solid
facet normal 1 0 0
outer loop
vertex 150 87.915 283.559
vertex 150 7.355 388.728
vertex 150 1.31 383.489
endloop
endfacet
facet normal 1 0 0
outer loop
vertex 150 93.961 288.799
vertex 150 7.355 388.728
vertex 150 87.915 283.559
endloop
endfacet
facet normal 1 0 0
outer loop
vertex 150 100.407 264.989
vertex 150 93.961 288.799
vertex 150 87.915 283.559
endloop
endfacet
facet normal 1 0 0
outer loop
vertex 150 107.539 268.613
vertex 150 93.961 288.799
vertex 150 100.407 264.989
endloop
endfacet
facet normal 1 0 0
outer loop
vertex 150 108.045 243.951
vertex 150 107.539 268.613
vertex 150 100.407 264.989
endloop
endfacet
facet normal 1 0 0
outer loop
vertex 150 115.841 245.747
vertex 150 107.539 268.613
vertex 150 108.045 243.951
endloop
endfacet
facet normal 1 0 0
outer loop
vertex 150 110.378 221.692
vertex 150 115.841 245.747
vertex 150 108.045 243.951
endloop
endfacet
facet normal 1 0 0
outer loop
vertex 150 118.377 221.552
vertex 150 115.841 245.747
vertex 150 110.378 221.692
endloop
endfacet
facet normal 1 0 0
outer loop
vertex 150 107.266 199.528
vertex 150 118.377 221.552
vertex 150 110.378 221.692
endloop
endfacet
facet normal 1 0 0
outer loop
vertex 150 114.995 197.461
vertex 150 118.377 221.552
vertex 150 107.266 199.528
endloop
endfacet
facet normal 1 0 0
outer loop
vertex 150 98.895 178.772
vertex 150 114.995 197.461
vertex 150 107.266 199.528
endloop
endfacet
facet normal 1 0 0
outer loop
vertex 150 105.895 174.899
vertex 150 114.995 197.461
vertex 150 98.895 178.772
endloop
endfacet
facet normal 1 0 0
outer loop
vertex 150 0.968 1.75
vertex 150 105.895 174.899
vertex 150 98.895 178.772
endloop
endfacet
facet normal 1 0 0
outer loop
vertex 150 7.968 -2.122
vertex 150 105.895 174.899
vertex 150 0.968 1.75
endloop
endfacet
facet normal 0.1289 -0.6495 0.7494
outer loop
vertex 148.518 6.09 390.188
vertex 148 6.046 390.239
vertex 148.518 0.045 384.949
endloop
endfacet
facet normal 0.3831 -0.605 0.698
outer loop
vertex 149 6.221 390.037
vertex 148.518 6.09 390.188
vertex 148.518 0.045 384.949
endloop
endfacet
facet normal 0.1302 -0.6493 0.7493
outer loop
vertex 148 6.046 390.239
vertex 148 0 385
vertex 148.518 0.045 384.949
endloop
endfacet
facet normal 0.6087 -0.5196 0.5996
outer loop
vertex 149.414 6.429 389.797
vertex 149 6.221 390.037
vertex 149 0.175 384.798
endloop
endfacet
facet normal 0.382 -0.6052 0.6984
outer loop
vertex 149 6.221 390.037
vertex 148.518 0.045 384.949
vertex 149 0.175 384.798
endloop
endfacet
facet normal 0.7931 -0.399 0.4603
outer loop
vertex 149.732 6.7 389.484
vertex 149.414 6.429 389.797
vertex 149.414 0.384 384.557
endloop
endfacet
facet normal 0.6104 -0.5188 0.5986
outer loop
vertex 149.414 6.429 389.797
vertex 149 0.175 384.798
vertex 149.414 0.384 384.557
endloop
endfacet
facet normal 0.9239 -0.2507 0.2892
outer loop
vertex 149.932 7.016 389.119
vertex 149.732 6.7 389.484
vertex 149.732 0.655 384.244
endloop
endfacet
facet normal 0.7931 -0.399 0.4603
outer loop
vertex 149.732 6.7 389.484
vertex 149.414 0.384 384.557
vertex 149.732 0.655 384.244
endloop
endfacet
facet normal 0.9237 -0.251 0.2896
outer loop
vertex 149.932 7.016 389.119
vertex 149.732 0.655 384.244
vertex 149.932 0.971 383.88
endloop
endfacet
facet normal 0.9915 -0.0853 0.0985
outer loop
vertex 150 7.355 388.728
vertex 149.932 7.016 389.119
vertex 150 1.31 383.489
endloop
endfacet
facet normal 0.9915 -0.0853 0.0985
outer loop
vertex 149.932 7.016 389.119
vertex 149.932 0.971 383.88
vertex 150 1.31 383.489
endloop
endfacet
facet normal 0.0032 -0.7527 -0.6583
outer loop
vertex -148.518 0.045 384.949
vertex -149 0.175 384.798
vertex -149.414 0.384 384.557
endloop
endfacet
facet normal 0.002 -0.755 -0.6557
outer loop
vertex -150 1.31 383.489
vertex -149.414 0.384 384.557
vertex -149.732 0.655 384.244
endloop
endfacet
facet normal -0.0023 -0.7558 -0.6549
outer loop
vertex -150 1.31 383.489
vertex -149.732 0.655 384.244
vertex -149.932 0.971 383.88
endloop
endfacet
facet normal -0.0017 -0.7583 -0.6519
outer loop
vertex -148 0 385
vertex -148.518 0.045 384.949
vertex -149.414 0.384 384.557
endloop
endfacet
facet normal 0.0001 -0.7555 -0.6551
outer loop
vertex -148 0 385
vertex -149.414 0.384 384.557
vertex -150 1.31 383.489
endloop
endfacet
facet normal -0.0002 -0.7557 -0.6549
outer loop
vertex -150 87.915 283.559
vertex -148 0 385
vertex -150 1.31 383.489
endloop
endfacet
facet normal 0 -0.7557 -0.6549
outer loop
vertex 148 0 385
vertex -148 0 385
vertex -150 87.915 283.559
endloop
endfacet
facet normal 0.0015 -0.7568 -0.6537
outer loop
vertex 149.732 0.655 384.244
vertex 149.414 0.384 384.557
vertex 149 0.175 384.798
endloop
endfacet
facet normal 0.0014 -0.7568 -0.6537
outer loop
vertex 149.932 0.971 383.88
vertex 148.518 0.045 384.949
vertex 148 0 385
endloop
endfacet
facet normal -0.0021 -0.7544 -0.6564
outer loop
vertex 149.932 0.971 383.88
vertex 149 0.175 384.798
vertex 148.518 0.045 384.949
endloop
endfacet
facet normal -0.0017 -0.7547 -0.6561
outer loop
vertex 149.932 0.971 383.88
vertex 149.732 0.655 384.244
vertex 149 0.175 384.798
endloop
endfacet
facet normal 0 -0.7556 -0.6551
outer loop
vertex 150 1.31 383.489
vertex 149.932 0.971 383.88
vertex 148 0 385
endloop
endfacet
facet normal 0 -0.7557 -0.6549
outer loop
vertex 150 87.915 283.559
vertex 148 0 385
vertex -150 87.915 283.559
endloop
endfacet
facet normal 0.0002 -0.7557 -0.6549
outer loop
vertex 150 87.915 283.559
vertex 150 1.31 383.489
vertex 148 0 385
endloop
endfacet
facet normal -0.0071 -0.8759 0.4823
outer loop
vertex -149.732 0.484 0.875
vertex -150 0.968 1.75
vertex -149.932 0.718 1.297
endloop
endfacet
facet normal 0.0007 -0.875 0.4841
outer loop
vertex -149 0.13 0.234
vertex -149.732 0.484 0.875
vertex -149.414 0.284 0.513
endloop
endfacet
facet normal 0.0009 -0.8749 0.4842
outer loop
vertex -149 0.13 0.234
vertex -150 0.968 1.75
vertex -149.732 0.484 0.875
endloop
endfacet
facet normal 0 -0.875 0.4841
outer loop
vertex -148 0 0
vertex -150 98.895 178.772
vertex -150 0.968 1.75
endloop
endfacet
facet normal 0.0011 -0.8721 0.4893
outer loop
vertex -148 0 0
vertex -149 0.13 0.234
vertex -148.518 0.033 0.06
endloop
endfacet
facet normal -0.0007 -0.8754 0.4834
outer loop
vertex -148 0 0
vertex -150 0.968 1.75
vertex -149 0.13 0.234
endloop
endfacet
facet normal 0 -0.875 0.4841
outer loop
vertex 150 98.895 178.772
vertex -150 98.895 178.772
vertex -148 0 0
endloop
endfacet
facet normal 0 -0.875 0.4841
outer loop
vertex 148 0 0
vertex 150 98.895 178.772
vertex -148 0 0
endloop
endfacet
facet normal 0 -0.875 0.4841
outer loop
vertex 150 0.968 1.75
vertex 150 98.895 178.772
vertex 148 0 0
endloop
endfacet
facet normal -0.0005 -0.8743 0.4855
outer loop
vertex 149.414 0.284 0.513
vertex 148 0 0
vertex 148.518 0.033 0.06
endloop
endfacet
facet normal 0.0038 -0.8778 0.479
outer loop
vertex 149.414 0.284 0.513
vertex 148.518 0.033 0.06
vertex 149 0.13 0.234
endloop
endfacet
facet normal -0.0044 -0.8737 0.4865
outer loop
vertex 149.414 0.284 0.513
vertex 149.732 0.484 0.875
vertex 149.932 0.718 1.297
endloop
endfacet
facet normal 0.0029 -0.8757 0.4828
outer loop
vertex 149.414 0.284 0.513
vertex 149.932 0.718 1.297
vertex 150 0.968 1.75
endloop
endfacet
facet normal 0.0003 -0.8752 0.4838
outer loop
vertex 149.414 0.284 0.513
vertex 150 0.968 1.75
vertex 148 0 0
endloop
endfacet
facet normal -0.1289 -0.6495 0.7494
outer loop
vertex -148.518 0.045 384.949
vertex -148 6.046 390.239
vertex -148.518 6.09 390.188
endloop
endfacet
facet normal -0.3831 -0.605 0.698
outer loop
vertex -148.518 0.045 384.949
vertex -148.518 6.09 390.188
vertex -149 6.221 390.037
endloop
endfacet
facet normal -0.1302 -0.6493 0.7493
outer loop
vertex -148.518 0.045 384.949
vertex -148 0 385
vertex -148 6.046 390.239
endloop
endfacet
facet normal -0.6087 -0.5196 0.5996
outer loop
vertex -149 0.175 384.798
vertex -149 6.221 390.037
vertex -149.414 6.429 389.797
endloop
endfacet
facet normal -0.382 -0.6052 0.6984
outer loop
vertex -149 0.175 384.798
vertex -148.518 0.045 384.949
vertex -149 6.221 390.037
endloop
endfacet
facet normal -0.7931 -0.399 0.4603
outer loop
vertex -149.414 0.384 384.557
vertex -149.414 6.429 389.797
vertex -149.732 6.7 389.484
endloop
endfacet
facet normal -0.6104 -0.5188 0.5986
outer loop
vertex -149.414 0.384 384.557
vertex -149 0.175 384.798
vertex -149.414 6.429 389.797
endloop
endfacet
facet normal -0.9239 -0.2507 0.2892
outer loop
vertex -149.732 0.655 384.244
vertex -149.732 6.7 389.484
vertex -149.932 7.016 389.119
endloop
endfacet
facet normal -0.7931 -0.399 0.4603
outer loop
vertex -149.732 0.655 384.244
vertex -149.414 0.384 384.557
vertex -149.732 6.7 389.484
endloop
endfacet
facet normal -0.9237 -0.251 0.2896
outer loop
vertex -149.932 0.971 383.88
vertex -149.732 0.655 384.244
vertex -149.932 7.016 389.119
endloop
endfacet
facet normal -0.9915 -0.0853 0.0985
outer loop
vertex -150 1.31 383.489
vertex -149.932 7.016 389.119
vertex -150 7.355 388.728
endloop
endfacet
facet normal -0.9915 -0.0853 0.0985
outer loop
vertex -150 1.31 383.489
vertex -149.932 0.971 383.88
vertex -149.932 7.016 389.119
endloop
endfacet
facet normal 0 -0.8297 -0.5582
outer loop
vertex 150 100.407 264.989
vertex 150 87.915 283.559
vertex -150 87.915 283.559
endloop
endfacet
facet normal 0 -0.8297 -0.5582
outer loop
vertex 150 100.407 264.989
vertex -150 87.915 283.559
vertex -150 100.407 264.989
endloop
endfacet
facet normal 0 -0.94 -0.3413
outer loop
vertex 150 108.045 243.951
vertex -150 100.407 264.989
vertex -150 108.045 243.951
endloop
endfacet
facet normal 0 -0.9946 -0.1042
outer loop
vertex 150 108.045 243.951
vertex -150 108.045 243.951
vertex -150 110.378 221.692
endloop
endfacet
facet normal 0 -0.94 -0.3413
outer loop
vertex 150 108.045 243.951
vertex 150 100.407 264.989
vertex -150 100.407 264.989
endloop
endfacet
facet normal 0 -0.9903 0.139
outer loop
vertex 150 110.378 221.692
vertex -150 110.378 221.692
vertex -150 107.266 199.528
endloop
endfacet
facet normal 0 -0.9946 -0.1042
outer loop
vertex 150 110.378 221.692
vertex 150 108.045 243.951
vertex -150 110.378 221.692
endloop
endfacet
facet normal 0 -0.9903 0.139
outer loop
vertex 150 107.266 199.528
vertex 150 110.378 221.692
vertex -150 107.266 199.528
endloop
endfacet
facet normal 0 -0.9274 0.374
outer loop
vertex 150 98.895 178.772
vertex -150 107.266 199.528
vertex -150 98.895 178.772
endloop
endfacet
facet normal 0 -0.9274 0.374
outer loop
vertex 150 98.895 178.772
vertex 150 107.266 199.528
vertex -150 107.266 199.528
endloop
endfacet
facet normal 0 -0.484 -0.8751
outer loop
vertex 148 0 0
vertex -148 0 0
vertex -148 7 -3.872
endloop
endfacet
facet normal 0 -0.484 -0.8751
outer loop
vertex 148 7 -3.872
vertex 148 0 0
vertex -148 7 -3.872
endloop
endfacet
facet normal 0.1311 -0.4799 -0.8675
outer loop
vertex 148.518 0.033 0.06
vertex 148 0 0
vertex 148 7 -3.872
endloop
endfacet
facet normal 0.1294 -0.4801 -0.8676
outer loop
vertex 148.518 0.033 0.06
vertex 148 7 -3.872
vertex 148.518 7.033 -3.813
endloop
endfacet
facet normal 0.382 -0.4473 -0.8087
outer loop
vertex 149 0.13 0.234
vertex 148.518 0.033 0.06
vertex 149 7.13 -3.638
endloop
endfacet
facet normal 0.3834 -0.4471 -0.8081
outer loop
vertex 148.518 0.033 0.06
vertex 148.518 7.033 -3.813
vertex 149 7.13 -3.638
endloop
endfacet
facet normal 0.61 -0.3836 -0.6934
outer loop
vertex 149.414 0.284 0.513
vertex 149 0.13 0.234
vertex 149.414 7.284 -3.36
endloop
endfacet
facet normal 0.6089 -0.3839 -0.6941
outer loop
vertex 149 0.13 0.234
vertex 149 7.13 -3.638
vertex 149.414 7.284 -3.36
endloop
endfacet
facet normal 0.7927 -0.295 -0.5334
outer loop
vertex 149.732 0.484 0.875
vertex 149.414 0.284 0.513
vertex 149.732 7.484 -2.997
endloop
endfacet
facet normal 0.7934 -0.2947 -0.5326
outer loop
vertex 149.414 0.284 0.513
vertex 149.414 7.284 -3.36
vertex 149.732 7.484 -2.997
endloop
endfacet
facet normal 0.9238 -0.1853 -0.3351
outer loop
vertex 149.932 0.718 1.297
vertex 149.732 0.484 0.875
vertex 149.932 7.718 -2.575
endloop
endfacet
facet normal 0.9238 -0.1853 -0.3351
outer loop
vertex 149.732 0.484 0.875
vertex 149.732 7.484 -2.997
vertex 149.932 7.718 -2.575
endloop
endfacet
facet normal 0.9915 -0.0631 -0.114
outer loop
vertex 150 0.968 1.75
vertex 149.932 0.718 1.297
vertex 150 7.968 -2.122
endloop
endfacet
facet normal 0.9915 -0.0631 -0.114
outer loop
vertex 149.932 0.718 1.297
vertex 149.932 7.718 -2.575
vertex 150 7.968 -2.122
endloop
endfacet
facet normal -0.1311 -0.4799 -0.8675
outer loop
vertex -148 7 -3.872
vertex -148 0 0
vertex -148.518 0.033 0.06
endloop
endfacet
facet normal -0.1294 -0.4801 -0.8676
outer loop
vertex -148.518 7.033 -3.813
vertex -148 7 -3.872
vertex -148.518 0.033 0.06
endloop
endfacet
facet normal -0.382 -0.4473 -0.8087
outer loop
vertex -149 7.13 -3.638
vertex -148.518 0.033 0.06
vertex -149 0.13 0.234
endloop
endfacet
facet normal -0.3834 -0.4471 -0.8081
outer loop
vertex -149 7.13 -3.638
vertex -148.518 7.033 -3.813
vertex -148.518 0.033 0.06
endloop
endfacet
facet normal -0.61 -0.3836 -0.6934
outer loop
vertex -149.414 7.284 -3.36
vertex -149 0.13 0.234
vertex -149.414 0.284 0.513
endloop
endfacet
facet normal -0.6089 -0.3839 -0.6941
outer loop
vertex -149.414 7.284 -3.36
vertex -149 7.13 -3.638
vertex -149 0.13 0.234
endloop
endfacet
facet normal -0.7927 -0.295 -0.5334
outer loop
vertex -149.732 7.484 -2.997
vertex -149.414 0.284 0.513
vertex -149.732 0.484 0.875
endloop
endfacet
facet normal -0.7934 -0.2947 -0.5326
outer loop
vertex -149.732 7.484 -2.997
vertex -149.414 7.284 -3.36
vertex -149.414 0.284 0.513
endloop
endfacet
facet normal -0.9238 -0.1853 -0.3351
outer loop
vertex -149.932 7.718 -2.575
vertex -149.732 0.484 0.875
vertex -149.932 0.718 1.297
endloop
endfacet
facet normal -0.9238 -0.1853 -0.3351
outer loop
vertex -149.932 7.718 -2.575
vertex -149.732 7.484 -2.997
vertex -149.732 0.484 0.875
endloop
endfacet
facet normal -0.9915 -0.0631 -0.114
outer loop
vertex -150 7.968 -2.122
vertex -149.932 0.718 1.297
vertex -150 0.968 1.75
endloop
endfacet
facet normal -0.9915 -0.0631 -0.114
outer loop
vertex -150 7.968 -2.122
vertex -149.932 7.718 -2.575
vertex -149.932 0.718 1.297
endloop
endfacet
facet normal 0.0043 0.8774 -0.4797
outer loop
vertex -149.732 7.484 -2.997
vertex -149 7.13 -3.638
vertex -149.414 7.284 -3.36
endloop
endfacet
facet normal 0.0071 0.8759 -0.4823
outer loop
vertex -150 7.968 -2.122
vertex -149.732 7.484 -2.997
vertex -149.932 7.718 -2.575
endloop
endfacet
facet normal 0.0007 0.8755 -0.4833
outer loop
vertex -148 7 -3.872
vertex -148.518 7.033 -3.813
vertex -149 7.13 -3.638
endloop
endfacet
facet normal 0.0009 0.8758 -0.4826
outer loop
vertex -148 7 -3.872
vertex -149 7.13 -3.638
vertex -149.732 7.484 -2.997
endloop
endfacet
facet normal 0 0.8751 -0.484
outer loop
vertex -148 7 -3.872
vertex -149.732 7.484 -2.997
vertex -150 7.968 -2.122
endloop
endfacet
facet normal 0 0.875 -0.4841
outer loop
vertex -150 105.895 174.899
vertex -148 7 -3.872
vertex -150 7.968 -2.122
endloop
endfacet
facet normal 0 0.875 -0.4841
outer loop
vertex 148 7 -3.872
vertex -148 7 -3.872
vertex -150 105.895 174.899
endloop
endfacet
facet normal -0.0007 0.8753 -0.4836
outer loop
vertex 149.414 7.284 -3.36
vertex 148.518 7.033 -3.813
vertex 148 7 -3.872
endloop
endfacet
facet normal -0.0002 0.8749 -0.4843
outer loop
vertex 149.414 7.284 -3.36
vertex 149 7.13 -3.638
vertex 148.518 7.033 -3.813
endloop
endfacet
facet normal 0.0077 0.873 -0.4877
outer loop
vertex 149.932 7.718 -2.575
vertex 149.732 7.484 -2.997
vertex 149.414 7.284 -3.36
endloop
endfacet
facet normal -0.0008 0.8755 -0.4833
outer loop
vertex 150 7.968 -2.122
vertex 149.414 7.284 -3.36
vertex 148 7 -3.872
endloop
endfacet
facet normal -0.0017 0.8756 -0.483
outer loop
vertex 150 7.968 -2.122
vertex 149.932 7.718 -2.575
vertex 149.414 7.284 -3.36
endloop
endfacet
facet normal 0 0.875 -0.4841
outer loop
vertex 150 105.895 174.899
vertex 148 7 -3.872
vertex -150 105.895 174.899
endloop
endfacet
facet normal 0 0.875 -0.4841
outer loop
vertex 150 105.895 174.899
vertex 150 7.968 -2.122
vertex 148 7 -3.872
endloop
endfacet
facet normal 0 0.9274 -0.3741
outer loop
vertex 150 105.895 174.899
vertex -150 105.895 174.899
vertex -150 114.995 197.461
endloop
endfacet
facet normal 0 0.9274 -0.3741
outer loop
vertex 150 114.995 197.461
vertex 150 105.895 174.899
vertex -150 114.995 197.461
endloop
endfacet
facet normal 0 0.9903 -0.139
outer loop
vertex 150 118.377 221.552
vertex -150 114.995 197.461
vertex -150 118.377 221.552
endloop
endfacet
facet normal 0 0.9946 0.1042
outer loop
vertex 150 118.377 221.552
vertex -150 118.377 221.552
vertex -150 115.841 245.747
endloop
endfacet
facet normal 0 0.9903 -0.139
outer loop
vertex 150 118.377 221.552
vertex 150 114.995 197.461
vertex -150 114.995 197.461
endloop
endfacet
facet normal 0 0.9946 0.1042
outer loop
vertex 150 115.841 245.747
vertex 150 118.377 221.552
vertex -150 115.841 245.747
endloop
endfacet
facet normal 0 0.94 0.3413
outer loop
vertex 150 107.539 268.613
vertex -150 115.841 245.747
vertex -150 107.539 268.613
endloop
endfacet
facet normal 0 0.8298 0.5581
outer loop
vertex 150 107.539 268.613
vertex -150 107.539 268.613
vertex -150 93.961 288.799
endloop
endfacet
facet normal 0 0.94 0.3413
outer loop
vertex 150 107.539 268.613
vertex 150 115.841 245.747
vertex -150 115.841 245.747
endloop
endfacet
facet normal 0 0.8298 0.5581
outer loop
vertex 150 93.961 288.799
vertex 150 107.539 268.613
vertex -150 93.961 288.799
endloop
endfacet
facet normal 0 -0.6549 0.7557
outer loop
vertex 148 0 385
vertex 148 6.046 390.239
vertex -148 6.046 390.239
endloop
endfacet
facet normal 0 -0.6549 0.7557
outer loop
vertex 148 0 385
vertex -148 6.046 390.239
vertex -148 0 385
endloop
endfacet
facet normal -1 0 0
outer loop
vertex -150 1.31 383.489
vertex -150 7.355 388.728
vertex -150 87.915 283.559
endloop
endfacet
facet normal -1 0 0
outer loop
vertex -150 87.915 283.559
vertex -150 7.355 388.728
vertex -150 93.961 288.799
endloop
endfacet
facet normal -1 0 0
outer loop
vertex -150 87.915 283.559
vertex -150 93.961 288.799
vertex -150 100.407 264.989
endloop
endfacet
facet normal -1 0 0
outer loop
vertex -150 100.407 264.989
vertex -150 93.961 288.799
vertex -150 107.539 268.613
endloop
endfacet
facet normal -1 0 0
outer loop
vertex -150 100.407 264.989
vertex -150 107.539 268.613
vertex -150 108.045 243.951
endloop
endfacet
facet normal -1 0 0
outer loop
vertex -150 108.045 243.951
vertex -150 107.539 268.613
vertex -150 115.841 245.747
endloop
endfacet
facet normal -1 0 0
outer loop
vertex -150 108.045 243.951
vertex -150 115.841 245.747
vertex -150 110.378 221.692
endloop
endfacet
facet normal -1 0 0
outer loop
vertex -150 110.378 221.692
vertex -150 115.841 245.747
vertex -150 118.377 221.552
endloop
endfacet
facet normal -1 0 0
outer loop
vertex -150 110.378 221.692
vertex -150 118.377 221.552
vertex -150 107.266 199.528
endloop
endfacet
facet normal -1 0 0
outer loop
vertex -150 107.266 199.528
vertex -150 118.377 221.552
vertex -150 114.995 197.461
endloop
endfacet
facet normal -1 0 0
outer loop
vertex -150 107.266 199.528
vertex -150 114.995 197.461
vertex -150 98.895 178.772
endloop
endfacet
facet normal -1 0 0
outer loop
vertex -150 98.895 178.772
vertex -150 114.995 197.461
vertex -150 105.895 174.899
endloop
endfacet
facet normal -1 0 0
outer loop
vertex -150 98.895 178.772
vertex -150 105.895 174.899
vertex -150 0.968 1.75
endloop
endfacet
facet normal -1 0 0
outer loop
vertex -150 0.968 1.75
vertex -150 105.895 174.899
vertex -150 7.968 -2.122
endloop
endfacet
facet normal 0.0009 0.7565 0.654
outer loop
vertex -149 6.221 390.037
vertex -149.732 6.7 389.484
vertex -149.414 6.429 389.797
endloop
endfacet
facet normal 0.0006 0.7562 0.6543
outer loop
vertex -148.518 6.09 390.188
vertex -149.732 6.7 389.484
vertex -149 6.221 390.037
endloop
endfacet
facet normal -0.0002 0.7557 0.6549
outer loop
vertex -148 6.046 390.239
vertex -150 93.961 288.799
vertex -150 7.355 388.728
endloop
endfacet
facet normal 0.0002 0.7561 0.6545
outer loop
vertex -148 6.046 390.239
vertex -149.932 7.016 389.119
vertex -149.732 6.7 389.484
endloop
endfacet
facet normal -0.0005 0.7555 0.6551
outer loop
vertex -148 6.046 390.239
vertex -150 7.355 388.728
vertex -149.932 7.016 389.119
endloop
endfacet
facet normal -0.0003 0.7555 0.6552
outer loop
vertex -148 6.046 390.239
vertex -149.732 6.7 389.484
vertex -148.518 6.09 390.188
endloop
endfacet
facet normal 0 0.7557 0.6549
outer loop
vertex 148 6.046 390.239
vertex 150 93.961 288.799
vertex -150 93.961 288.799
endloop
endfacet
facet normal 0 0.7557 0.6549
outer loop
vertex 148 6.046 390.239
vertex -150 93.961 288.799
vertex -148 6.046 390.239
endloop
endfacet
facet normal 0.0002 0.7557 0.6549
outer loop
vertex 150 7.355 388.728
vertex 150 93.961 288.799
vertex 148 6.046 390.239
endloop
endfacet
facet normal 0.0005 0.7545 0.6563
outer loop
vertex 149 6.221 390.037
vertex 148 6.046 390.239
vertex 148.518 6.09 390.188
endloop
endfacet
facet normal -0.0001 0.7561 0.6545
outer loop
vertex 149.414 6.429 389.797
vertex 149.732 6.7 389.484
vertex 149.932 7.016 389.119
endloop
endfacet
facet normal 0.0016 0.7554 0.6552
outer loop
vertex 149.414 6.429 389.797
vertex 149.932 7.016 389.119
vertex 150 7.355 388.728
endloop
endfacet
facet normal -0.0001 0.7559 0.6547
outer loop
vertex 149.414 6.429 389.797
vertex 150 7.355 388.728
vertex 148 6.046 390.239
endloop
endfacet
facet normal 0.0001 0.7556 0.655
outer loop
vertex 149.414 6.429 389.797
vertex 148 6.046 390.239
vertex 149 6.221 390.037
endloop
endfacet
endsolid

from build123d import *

# Parameters (mm, degrees)
BASE_FLANGE1_DEPTH = 150
FILLET_2_0_R       = 2


# Sheet-metal steps are written as plain solids
with BuildPart() as part:
    # Sketch1 → Base-Flange1 (new, symmetric)
    with BuildSketch(Plane(origin=(0, 0, 0), x_dir=(0, 0, -1), z_dir=(1, 0, 0))):
        with BuildLine():
            Line((-385, 0), (-283.559185115, 87.915372901))
            ThreePointArc((-283.559185115, 87.915372901), (-232.892960746, 109.891059496), (-178.771928145, 98.895109186))
            Line((-178.771928145, 98.895109186), (0, 0))
            Line((0, 0), (3.872491081, 7.000272339))
            Line((3.872491081, 7.000272339), (-174.899437063, 105.895381526))
            ThreePointArc((-174.899437063, 105.895381526), (-233.726646413, 117.847501428), (-288.798629422, 93.960885563))
            Line((-288.798629422, 93.960885563), (-390.239444307, 6.045512662))
            Line((-390.239444307, 6.045512662), (-385, 0))
        make_face()
    extrude(amount=BASE_FLANGE1_DEPTH, both=True)

    # Fillet-2.0
    fillet_2_0_edges = [part.edges().sort_by_distance(p)[0] for p in [
        (150, 3.022756331, 387.619722154),
        (150, 3.50013617, -1.936245541),
        (-150, 3.022756331, 387.619722154),
        (-150, 3.50013617, -1.936245541),
    ]]
    fillet(fillet_2_0_edges, radius=FILLET_2_0_R)


solid = part.part
